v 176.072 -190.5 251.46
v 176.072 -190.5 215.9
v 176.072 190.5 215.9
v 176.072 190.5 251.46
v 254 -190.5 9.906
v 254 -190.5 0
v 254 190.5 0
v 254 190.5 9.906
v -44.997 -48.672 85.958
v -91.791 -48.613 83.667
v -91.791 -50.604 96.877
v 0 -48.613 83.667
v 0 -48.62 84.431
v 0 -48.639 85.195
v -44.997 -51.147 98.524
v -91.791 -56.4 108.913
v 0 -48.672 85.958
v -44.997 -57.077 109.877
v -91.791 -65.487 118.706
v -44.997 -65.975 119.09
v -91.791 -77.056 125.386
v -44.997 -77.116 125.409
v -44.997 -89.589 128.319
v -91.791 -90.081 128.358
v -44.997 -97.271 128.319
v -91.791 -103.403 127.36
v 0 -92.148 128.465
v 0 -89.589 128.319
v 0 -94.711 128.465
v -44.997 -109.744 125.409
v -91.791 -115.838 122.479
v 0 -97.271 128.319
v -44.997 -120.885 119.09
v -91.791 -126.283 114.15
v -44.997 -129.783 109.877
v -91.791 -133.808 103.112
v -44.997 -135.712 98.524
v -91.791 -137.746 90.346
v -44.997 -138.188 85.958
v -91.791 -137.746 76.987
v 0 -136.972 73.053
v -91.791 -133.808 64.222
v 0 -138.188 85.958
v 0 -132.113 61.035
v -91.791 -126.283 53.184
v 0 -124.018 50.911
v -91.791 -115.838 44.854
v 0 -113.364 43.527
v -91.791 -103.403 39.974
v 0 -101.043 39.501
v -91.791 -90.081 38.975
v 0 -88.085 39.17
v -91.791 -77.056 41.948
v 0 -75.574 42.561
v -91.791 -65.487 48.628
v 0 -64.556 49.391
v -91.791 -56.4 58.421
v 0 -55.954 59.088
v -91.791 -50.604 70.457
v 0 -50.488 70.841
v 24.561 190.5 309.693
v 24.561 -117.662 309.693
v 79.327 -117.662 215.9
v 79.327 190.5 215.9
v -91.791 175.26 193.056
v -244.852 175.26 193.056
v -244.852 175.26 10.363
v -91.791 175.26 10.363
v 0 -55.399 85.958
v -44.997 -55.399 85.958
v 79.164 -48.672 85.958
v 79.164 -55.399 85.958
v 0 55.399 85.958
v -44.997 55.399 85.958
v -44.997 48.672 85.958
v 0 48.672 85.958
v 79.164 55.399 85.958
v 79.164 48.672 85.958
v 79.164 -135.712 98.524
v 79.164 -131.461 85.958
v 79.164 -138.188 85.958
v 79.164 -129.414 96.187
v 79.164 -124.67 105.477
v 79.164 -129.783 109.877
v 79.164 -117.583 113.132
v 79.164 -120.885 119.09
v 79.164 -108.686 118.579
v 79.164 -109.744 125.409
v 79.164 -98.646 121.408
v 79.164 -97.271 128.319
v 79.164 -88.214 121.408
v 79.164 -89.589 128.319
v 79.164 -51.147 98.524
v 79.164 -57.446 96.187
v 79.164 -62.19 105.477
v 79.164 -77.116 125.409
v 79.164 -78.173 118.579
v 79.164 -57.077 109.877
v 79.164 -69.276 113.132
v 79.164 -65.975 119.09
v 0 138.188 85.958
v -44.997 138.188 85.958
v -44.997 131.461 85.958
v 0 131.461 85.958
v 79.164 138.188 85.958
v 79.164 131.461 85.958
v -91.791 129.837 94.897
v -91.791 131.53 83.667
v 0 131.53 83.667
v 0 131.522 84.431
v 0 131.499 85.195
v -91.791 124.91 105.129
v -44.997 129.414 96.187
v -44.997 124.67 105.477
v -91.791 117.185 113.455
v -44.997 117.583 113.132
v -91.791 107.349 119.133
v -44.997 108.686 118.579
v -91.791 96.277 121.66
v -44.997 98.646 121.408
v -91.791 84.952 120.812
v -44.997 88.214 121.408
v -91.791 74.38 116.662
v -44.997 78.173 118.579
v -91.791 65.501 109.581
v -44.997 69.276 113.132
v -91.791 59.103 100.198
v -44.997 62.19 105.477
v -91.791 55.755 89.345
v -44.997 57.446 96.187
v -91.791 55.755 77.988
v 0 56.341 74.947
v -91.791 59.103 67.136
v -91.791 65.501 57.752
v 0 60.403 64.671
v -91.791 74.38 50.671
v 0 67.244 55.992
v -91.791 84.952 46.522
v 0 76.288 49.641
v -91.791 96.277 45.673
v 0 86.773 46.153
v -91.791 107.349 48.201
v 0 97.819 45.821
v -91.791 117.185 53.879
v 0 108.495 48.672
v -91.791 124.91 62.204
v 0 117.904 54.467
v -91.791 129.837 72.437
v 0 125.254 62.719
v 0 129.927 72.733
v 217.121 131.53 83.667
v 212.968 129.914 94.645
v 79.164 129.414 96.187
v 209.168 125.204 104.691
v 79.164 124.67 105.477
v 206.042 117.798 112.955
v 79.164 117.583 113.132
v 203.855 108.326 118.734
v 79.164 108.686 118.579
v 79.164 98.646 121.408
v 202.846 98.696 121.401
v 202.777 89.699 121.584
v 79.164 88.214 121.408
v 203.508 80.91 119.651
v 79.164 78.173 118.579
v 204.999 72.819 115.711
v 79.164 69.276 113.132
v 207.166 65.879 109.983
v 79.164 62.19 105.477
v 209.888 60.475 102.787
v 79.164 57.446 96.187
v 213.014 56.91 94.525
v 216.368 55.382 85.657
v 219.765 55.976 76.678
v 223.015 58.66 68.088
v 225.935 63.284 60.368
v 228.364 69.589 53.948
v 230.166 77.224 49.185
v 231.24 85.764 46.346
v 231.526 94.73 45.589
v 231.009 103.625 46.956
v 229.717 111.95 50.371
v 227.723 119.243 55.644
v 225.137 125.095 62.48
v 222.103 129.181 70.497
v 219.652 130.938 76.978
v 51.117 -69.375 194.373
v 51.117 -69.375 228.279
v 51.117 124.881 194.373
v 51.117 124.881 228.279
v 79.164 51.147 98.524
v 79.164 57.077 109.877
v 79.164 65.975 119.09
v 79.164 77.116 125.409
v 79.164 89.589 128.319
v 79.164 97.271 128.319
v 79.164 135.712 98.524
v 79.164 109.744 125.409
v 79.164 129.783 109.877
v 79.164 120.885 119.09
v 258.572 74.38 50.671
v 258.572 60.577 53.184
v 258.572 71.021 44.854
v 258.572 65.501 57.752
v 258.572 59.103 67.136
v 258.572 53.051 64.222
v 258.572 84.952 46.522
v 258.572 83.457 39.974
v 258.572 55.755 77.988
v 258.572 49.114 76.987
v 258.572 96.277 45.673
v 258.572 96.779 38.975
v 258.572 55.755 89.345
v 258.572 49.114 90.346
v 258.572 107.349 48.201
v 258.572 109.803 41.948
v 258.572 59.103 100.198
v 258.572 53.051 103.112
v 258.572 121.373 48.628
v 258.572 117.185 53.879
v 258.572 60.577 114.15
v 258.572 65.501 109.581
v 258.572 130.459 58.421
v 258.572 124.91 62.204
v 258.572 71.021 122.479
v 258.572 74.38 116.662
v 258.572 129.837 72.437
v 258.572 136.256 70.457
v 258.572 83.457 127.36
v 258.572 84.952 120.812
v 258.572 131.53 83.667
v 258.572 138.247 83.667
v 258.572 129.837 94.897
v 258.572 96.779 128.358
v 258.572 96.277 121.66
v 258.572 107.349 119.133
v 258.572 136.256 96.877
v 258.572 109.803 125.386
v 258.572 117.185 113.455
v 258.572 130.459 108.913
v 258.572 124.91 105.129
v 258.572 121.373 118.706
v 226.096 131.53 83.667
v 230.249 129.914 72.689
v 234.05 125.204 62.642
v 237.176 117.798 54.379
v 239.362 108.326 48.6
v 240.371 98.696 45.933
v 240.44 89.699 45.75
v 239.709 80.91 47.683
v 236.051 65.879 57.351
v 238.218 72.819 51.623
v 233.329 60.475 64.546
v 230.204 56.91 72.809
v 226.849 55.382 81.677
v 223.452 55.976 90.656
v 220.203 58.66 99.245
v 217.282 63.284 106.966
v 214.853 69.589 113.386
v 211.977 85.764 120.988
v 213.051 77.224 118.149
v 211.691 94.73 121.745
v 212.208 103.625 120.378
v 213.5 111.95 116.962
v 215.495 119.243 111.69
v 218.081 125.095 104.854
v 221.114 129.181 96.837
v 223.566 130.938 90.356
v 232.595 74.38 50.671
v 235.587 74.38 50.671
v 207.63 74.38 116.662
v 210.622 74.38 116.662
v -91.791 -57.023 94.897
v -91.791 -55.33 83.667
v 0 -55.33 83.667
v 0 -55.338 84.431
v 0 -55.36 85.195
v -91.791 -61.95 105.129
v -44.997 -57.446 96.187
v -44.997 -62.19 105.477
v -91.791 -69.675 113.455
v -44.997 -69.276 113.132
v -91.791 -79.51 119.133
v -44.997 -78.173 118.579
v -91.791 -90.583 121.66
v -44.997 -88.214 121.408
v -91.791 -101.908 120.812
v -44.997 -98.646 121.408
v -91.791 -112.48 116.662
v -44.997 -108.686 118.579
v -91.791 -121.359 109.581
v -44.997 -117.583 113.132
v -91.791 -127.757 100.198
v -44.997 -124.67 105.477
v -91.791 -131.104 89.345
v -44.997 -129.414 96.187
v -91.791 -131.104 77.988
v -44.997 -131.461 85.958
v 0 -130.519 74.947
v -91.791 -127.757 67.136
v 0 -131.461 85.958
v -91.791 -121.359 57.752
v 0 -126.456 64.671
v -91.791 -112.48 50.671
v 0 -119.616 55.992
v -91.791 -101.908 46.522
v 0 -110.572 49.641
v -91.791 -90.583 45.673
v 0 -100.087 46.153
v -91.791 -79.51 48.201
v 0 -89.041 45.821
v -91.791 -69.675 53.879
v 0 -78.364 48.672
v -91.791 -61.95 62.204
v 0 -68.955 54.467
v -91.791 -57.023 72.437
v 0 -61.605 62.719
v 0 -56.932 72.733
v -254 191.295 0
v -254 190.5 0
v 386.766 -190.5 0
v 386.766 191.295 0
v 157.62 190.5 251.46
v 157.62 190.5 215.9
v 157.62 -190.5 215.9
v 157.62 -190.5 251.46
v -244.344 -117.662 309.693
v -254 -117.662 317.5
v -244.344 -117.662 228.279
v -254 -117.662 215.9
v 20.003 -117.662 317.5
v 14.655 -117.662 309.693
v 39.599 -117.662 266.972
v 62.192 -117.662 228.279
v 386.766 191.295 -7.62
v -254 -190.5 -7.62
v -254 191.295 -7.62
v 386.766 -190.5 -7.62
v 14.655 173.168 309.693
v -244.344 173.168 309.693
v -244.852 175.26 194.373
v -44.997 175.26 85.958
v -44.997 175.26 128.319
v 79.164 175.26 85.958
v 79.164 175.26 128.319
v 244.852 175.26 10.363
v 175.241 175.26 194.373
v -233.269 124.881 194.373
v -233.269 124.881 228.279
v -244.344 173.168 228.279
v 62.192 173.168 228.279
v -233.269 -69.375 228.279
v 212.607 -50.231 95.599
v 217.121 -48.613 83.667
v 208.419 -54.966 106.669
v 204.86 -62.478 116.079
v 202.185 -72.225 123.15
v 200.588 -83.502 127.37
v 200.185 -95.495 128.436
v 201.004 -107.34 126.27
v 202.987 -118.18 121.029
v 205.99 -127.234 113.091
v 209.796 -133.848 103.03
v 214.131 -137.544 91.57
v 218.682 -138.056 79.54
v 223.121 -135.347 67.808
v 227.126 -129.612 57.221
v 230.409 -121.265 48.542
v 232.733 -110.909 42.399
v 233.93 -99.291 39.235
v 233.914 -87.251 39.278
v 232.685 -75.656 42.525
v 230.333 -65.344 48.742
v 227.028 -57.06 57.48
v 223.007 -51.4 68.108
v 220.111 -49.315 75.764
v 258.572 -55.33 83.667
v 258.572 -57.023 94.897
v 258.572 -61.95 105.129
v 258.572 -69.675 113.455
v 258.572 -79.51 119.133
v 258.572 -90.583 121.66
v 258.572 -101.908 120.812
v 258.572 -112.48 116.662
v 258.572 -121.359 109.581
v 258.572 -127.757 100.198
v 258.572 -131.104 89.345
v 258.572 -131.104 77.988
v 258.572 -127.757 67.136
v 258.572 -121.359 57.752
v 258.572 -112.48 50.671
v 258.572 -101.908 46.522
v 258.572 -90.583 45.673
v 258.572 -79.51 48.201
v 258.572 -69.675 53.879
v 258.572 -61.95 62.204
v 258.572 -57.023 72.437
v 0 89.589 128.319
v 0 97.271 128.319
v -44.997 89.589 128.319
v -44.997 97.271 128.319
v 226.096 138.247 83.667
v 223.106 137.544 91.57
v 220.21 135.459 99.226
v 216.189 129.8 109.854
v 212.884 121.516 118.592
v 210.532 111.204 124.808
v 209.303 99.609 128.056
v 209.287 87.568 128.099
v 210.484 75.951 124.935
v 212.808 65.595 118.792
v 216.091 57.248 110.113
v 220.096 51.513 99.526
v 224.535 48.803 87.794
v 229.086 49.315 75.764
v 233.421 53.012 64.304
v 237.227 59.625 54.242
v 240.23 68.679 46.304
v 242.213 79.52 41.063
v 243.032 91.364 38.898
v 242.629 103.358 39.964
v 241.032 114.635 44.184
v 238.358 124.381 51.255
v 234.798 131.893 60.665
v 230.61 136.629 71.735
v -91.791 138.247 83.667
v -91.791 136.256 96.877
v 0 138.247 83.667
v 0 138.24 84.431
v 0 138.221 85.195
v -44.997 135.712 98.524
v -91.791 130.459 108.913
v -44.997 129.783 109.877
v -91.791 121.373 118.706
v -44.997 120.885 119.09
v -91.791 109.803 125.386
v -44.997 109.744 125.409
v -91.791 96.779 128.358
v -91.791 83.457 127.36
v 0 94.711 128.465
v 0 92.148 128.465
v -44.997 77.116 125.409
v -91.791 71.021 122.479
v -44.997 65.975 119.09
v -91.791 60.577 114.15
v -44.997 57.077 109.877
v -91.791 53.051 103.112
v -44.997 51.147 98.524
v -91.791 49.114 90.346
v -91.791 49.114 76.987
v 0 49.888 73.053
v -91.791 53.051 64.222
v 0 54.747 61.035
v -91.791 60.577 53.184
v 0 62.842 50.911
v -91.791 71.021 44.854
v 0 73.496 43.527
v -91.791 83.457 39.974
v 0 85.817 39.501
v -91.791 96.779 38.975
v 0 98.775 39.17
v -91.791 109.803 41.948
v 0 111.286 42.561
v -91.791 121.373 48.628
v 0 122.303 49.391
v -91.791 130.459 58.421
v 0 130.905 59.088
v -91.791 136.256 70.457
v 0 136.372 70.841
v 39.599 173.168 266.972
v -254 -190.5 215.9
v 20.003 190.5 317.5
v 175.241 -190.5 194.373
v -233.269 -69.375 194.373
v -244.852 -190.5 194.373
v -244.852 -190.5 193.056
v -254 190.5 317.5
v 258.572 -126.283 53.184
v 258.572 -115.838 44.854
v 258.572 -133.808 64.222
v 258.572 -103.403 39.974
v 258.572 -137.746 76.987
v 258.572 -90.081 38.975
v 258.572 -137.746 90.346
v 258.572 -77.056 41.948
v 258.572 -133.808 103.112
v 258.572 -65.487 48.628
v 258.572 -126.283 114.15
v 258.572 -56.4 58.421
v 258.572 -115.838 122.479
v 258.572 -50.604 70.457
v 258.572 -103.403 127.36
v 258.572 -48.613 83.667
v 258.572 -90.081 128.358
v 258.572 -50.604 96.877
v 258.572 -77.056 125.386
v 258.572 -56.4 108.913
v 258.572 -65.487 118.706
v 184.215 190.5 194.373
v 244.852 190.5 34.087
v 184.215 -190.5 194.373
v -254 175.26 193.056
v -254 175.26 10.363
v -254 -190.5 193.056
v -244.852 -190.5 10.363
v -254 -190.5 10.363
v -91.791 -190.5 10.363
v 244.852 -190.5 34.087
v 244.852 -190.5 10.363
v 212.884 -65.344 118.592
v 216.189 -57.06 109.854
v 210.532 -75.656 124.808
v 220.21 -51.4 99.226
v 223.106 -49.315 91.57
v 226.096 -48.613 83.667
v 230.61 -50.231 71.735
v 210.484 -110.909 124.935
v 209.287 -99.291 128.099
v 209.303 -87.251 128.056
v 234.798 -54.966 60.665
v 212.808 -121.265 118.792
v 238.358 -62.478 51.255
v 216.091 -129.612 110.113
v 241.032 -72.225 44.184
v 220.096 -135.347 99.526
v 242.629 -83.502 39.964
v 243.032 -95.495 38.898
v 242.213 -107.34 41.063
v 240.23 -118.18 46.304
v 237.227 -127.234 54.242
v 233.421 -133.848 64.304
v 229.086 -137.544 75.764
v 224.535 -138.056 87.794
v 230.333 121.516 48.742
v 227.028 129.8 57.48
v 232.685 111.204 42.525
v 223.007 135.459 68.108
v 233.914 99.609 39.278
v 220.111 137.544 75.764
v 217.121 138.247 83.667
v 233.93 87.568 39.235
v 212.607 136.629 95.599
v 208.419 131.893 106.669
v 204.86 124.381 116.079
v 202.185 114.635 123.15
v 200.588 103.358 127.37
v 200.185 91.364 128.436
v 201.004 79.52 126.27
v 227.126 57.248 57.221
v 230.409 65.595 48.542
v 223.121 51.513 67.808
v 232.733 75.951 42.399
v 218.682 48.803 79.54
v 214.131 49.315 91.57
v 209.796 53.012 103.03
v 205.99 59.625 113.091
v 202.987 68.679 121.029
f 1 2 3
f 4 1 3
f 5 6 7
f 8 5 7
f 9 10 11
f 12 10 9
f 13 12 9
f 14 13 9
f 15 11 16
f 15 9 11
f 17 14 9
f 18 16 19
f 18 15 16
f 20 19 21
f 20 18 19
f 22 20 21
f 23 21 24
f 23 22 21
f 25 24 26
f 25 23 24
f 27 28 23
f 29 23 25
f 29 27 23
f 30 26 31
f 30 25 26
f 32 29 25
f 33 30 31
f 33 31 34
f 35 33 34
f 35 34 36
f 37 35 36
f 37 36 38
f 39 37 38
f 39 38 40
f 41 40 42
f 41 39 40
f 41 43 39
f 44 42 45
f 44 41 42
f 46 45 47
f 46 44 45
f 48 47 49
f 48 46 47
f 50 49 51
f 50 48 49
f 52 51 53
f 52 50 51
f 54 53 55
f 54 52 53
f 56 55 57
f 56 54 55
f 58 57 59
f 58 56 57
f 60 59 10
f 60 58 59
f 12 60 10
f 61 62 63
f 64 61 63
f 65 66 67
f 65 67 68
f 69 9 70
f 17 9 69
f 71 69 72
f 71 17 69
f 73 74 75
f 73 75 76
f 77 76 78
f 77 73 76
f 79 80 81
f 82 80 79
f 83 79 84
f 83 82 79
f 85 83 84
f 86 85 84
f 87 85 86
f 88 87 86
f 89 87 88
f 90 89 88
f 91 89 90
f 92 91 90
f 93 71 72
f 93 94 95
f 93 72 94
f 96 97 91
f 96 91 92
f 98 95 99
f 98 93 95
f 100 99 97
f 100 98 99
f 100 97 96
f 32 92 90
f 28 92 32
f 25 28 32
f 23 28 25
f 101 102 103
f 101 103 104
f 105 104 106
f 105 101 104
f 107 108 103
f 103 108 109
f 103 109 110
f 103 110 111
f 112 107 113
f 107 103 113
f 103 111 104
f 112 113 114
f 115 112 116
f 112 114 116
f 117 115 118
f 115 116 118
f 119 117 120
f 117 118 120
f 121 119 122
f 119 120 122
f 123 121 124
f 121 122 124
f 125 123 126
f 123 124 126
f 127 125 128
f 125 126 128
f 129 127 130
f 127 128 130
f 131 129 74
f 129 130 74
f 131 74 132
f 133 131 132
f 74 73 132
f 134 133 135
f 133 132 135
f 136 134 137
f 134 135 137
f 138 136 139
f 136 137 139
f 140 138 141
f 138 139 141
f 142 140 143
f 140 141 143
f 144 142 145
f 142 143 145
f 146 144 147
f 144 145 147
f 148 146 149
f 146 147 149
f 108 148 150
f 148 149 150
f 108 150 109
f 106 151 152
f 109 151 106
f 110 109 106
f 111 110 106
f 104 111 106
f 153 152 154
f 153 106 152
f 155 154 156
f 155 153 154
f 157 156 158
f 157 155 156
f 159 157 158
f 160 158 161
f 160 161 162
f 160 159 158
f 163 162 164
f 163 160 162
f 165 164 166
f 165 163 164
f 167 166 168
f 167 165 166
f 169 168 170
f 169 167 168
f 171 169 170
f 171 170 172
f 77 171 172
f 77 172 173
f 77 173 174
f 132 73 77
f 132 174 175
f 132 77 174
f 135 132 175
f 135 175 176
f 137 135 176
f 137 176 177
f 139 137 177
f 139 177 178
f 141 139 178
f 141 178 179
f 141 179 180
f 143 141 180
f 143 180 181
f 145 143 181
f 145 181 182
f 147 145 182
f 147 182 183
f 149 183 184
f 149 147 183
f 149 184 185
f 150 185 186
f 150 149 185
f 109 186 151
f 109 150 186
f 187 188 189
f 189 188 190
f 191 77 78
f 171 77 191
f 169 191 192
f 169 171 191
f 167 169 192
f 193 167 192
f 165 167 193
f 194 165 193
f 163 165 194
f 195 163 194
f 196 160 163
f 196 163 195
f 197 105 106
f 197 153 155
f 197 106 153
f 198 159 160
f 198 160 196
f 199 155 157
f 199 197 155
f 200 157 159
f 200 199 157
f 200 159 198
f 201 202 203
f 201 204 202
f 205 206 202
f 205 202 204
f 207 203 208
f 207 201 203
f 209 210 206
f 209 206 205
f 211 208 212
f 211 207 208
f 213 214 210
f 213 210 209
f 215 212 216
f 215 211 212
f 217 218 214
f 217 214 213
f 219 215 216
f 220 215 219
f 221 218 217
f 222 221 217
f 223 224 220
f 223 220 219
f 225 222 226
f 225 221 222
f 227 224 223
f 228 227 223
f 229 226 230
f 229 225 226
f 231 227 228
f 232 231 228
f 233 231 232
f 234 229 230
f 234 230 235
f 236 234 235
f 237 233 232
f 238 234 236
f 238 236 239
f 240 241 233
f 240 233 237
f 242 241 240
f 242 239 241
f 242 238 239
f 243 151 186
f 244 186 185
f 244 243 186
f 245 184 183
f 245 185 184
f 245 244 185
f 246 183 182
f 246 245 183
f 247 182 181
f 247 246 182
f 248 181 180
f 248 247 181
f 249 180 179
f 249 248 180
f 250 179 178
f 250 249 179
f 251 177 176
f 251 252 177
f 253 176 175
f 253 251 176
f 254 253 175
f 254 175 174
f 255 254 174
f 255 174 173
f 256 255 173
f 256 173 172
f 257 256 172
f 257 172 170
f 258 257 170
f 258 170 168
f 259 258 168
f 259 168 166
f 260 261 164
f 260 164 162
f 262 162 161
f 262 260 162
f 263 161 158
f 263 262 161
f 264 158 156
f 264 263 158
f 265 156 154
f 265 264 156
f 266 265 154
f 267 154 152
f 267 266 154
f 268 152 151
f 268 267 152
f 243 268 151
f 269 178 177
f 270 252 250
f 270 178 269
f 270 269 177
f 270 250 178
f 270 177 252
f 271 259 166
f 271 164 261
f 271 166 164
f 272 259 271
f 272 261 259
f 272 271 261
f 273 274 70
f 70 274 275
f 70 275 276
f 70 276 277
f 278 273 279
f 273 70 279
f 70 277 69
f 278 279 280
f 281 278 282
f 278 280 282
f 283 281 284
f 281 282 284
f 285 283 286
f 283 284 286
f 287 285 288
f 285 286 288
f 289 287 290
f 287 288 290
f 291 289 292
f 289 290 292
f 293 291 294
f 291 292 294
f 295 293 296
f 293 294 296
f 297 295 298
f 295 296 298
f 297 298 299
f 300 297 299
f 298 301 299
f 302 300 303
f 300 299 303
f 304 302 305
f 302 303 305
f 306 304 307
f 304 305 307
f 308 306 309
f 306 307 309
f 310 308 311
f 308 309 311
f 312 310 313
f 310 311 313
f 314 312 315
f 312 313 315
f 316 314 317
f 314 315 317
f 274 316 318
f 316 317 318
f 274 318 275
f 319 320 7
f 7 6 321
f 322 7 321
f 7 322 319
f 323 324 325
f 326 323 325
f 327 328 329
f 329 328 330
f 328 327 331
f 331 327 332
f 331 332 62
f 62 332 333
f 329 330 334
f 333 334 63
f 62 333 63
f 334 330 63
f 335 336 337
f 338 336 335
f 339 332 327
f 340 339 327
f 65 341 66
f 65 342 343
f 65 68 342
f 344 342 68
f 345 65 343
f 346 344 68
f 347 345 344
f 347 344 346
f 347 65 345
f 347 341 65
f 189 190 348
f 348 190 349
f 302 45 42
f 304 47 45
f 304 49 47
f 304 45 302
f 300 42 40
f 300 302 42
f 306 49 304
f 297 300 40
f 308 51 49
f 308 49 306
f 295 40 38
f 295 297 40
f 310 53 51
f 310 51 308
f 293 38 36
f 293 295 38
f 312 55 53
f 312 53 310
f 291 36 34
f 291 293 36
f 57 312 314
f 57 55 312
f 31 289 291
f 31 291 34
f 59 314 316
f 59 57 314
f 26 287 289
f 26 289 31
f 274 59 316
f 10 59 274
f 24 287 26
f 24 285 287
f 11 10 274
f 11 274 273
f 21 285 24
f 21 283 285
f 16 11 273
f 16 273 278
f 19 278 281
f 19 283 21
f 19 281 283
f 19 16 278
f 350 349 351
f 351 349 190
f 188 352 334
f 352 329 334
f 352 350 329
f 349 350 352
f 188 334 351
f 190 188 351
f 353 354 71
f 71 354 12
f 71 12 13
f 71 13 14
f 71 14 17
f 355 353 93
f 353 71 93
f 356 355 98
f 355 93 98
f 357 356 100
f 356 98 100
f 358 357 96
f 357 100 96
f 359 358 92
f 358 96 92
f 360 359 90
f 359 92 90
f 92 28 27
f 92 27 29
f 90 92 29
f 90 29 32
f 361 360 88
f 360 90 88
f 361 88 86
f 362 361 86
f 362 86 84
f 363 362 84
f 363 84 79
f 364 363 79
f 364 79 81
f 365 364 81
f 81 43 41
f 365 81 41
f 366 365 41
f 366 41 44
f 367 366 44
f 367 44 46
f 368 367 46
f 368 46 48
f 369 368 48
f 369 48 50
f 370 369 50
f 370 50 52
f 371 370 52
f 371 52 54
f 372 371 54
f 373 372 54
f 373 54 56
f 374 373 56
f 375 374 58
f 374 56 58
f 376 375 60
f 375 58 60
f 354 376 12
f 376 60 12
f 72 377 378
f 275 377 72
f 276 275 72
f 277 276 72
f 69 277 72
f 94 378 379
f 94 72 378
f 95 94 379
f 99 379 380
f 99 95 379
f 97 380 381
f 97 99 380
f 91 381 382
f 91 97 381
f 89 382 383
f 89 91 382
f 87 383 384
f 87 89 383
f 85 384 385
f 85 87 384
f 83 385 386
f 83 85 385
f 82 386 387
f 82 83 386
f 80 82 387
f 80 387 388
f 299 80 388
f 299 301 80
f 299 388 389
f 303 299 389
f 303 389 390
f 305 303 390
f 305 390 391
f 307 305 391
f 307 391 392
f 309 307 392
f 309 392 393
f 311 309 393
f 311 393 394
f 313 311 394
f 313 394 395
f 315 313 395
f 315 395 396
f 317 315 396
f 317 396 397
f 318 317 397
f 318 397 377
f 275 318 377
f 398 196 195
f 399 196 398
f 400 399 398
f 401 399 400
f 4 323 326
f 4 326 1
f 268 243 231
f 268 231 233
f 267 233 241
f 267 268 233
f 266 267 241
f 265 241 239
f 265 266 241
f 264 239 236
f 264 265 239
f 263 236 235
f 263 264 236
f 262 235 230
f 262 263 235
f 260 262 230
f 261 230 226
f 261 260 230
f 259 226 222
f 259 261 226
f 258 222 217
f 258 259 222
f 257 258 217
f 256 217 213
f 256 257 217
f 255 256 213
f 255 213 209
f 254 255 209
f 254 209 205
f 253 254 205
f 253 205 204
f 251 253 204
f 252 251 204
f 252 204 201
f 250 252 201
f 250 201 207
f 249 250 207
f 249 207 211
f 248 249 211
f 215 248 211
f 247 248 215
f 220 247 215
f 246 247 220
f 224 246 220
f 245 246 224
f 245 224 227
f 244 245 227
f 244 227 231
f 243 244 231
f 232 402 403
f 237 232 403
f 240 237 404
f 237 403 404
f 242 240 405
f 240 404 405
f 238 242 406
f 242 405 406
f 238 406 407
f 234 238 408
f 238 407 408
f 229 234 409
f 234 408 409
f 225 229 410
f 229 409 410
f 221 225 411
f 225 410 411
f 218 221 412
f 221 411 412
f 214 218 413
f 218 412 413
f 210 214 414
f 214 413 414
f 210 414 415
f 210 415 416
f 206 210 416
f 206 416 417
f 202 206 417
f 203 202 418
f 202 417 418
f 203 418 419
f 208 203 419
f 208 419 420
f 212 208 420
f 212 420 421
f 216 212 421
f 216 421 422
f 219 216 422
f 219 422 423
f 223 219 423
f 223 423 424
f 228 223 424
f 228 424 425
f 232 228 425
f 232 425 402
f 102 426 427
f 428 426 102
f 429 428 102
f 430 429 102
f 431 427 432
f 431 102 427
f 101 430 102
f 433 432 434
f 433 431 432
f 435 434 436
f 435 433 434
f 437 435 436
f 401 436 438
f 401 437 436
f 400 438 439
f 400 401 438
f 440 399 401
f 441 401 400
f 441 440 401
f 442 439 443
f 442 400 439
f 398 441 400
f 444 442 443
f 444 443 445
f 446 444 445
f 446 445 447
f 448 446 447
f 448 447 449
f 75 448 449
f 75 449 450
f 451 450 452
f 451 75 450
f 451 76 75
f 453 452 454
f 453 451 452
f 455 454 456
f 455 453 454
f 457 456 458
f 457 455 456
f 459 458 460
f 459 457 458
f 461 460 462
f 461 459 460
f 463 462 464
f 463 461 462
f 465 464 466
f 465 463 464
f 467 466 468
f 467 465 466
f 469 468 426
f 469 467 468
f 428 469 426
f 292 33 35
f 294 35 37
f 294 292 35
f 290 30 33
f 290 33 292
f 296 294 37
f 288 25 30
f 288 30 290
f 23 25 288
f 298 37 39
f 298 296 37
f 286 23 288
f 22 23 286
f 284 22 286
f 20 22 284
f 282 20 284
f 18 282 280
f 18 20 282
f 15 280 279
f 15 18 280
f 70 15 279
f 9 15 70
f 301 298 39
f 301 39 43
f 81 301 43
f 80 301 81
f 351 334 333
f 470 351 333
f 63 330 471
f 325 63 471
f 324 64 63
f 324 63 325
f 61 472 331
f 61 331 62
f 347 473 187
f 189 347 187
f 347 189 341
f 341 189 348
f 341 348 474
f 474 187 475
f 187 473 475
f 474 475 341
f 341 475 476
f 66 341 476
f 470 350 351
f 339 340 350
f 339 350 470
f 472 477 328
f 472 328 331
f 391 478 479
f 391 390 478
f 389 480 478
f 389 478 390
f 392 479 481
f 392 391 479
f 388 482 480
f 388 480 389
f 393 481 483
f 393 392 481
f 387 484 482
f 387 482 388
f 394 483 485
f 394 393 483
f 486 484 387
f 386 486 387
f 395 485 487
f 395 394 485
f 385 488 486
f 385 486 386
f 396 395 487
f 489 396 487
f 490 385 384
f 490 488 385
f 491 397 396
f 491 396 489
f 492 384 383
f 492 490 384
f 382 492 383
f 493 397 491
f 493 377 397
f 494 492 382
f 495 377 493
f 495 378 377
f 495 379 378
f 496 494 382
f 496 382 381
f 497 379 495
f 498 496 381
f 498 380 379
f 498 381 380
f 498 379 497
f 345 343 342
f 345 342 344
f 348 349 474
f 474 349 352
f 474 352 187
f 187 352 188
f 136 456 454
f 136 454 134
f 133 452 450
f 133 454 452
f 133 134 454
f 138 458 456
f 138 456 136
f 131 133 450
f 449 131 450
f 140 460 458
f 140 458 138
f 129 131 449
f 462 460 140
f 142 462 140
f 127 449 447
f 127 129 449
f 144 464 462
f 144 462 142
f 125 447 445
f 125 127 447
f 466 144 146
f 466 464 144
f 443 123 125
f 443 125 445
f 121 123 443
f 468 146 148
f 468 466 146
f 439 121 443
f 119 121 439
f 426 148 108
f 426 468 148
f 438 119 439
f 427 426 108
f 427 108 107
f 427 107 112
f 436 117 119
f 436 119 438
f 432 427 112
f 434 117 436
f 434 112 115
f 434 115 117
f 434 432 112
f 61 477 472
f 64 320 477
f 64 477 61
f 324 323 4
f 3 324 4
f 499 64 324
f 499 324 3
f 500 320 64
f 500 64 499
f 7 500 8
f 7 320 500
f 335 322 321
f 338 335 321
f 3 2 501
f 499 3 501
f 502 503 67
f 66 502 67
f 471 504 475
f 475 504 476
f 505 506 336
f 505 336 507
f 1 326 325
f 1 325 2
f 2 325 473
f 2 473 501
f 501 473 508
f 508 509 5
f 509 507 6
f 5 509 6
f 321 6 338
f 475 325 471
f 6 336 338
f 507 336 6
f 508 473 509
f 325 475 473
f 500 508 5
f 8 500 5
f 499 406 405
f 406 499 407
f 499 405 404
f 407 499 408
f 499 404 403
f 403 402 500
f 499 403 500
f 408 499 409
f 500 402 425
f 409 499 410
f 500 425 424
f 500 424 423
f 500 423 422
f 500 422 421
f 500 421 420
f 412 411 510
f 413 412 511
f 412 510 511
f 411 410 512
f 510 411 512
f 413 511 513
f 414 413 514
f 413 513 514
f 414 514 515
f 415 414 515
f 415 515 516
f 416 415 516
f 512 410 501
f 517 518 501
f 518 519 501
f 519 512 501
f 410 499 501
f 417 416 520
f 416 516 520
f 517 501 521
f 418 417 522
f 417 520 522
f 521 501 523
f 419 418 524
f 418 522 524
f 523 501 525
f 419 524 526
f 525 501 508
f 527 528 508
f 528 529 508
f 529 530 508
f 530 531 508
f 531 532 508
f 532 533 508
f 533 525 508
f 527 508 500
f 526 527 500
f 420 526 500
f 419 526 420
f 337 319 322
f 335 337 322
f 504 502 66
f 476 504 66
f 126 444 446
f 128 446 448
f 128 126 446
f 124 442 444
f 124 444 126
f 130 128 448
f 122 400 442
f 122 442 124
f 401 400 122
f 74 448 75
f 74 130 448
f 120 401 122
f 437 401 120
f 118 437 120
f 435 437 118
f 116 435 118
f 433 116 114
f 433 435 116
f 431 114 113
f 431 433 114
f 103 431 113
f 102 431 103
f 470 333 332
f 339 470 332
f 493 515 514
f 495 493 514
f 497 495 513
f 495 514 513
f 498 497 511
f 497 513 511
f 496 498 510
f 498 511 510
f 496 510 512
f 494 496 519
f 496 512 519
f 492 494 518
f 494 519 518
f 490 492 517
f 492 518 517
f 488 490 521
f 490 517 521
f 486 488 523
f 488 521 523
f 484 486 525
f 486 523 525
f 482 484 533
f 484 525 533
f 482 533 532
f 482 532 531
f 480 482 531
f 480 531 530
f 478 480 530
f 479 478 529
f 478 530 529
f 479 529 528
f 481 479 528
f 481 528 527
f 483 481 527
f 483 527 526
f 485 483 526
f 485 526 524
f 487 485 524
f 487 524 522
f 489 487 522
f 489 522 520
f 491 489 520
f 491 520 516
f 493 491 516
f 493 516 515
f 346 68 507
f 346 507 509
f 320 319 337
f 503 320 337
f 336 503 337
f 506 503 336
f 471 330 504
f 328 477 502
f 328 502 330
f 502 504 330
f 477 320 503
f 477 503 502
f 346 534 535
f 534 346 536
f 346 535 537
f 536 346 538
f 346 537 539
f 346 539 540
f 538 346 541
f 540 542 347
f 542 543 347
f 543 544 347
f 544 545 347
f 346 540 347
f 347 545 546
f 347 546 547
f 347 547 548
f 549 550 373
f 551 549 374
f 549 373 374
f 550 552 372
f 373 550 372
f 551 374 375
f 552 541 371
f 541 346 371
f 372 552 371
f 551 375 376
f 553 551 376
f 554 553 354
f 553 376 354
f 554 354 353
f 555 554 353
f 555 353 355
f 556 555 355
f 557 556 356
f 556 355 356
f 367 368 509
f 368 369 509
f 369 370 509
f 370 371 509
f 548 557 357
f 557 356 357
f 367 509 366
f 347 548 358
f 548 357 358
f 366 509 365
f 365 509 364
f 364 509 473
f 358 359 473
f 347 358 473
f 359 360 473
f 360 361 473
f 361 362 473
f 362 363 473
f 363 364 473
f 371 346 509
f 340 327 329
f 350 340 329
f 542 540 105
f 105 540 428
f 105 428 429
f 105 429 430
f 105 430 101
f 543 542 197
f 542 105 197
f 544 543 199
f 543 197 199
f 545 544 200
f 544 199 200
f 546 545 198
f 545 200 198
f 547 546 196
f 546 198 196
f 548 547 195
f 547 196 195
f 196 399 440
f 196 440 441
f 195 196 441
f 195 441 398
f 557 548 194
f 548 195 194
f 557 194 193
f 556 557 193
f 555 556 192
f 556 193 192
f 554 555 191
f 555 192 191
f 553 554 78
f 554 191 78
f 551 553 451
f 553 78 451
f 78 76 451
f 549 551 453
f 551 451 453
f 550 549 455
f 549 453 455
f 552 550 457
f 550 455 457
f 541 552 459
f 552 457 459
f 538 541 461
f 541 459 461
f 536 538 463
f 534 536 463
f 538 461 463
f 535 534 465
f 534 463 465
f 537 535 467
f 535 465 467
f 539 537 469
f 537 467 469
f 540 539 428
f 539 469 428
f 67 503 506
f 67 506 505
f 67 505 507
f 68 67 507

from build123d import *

# Parameters (mm, degrees)
F0_W      = 154.8604735136
F0_H      = 381
F0_W_2    = 202.8337074444
F0_W_3    = 150.305819042
F1_DEPTH  = 215.9
F3_DEPTH  = 365.76
F4_DEPTH  = 474.472
F5_DEPTH  = 384.81
F6_DEPTH  = 463.296
F7_DEPTH  = 453.644
F8_DEPTH  = 401.828
F9_W      = 333.3268084526
F9_H      = 308.1617667079
F10_DEPTH = 101.6
F12_DEPTH = 332.74
F13_DEPTH = 290.83
F14_W     = 640.7658
F14_H     = 381.7952661514
F15_DEPTH = 7.62
F16_W     = 18.4519021228
F16_H     = 174.1818501353
F16_H_2   = 32.6362997293
F17_DEPTH = 35.56
F18_R     = 44.8167953051
F18_R_2   = 38.1
F19_DEPTH = 258.572
F20_DEPTH = 485.14
F21_DEPTH = 258.572
F22_DEPTH = 57.658
F23_DEPTH = 72.898
F24_DEPTH = 250.19
F25_W     = 142.1934430047
F25_H     = 97.1279808664
F26_DEPTH = 68.58
F28_DEPTH = 340.868
F30_W     = 177.6428297162
F30_H     = 182.6925156638
F31_DEPTH = 723.9


# Not quite as in the source:
# - the program builds the solid bodies; features that only make, move or delete a surface that nothing else refers to are left out


with BuildPart() as f1:
    # F0 (on Top) → F1 (new body)
    with BuildSketch(Plane.XY):
        with Locations((-176.5697632432, 0)):
            Rectangle(F0_W, F0_H)
        with Locations((2.2773272358, 0)):
            Rectangle(F0_W_2, F0_H)
        with Locations((178.847090479, 0)):
            Rectangle(F0_W_3, F0_H)
    extrude(amount=F1_DEPTH)

    # F2 (on face) → F3 (cut)
    with BuildSketch(Plane.XZ.offset(190.5)):
        Polygon((-244.8522895575, 194.3728802726), (-244.8522895575, 10.3632332757), (244.8522895575, 10.3632332757), (175.2408137327, 194.3728802726), align=None)
    extrude(amount=-F3_DEPTH, mode=Mode.SUBTRACT)

    # F2 (on face) → F4 (cut)
    with BuildSketch(Plane.XZ.offset(190.5)):
        Polygon((215.0387168483, 194.3728802726), (244.8522895575, 115.5642510209), (244.8522895575, 194.3728802726), align=None)
    extrude(amount=-F4_DEPTH, mode=Mode.SUBTRACT)

    # F2 (on face) → F5 (cut)
    with BuildSketch(Plane.XZ.offset(190.5)):
        Polygon((244.8522895575, 194.3728802726), (244.8522895575, 115.5642510209), (254, 91.3833677769), (254, 215.9), (206.8949341774, 215.9), (215.0387168483, 194.3728802726), align=None)
    extrude(amount=-F5_DEPTH, mode=Mode.SUBTRACT)

    # F2 (on face) → F6 (cut)
    with BuildSketch(Plane.XZ.offset(190.5)):
        Polygon((184.2154591353, 194.3728802726), (244.8522895575, 34.0866396952), (244.8522895575, 115.5642510209), (215.0387168483, 194.3728802726), align=None)
    extrude(amount=-F6_DEPTH, mode=Mode.SUBTRACT)

    # F2 (on face) → F7 (cut)
    with BuildSketch(Plane.XZ.offset(190.5)):
        Polygon((244.8522895575, 115.5642510209), (244.8522895575, 34.0866396952), (254, 9.9057564512), (254, 91.3833677769), align=None)
    extrude(amount=-F7_DEPTH, mode=Mode.SUBTRACT)

    # F2 (on face) → F8 (cut)
    with BuildSketch(Plane.XZ.offset(190.5)):
        Polygon((176.0716764644, 215.9), (184.2154591353, 194.3728802726), (215.0387168483, 194.3728802726), (206.8949341774, 215.9), align=None)
    extrude(amount=-F8_DEPTH, mode=Mode.SUBTRACT)

    # F9 (on face) → F10 (join)
    with BuildSketch(Plane.XY.offset(215.9)):
        with Locations((-87.3365957737, 36.4191166461)):
            Rectangle(F9_W, F9_H)
    extrude(amount=F10_DEPTH)

    # F11 (on face) → F12 (cut)
    with BuildSketch(Plane.XZ.offset(117.6617667079)):
        Polygon((62.1921845761, 266.8175234586), (79.3268084526, 266.7), (79.3268084526, 317.5), (20.0025010854, 317.5), (24.5608866934, 309.6932172775), (62.1921845761, 309.6932172775), align=None)
        Polygon((62.1921845761, 245.2451009057), (79.3268084526, 215.9), (79.3268084526, 266.7), (62.1921845761, 266.8175234586), align=None)
        Polygon((24.5608866934, 309.6932172775), (49.5453838887, 266.9042657045), (62.1921845761, 266.8175234586), (62.1921845761, 309.6932172775), align=None)
        Polygon((49.5453838887, 266.9042657045), (62.1921845761, 245.2451009057), (62.1921845761, 266.8175234586), align=None)
    extrude(amount=-F12_DEPTH, mode=Mode.SUBTRACT)

    # F11 (on face) → F13 (cut)
    with BuildSketch(Plane.XZ.offset(117.6617667079)):
        Polygon((-87.3365957737, 267.843115824), (39.5991766547, 266.9724850411), (14.6545127754, 309.6932172775), (-87.3365957737, 309.6932172775), align=None)
        Polygon((-244.3442642689, 268.9200046058), (-87.3365957737, 267.843115824), (-87.3365957737, 309.6932172775), (-244.3442642689, 309.6932172775), align=None)
        Polygon((-87.3365957737, 228.2792460185), (62.1921845761, 228.2792460185), (39.5991766547, 266.9724850411), (-87.3365957737, 267.843115824), align=None)
        Polygon((-244.3442642689, 228.2792460185), (-87.3365957737, 228.2792460185), (-87.3365957737, 267.843115824), (-244.3442642689, 268.9200046058), align=None)
    extrude(amount=-F13_DEPTH, mode=Mode.SUBTRACT)

    # F14 (on face) → F15 (join)
    with BuildSketch(Plane(origin=(0, 0, 0), x_dir=(1, 0, 0), z_dir=(0, 0, -1))):
        with Locations((66.3829, -0.3976330757)):
            Rectangle(F14_W, F14_H)
    extrude(amount=F15_DEPTH)

    # F16 (on face) → F17 (join)
    with BuildSketch(Plane.XY.offset(215.9)):
        with Locations((166.845725403, 103.4090749323)):
            Rectangle(F16_W, F16_H)
        with Locations((166.845725403, 0)):
            Rectangle(F16_W, F16_H_2)
        with Locations((166.845725403, -103.4090749323)):
            Rectangle(F16_W, F16_H)
    extrude(amount=F17_DEPTH)

    # F18 (on Right) → F19 (join)
    with BuildSketch(Plane.YZ):
        with Locations((-93.4298427632, 83.6668761742)):
            Circle(F18_R)
        with Locations((-93.4298427632, 83.6668761742)):
            Circle(F18_R_2, mode=Mode.SUBTRACT)
    extrude(amount=F19_DEPTH)

    # F18 (on Right) → F20 (cut)
    with BuildSketch(Plane.YZ):
        with Locations((-93.4298427632, 83.6668761742)):
            Circle(F18_R_2)
    extrude(amount=F20_DEPTH, mode=Mode.SUBTRACT)

    # F18 (on Right) → F21 (join)
    with BuildSketch(Plane.YZ):
        with Locations((93.4298427632, 83.6668761742)):
            Circle(F18_R)
        with Locations((93.4298427632, 83.6668761742)):
            Circle(F18_R_2, mode=Mode.SUBTRACT)
        with Locations((-93.4298427632, 83.6668761742)):
            Circle(F18_R)
        with Locations((-93.4298427632, 83.6668761742)):
            Circle(F18_R_2, mode=Mode.SUBTRACT)
    extrude(amount=F21_DEPTH)

    # F18 (on Right) → F22 (cut)
    with BuildSketch(Plane.YZ):
        with Locations((-93.4298427632, 83.6668761742)):
            Circle(F18_R)
        with Locations((-93.4298427632, 83.6668761742)):
            Circle(F18_R_2, mode=Mode.SUBTRACT)
        with Locations((93.4298427632, 83.6668761742)):
            Circle(F18_R)
        with Locations((93.4298427632, 83.6668761742)):
            Circle(F18_R_2, mode=Mode.SUBTRACT)
    extrude(amount=-F22_DEPTH, mode=Mode.SUBTRACT)

    # F18 (on Right) + F21_face (on face) → F23 (cut)
    with BuildSketch(Plane.YZ):
        with Locations((-93.4298427632, 83.6668761742)):
            Circle(F18_R)
        with Locations((-93.4298427632, 83.6668761742)):
            Circle(F18_R_2, mode=Mode.SUBTRACT)
        with Locations((93.4298427632, 83.6668761742)):
            Circle(F18_R)
        with Locations((93.4298427632, 83.6668761742)):
            Circle(F18_R_2, mode=Mode.SUBTRACT)
    with BuildSketch(Plane(origin=(226.0959173271, 93.4298427632, 83.6668761742), x_dir=(0, 1, 0), z_dir=(0.9353094659, 0, 0.3538307547))):
        with BuildLine():
            add(Edge.make_bspline(
                [(38.1, 0), (38.1, -70.5554024353), (-19.05, -35.2777012177), (-76.2, 0), (-19.05, 35.2777012177), (38.1, 70.5554024353), (38.1, 0)],
                knots=[1.5707963268, 1.5707963268, 1.5707963268, 3.6651914292, 3.6651914292, 5.7595865316, 5.7595865316, 7.853981634, 7.853981634, 7.853981634], degree=2, weights=[1, 0.5, 1, 0.5, 1, 0.5, 1]))
        make_face()
    extrude(amount=-F23_DEPTH, dir=(1, 0, 0), mode=Mode.SUBTRACT)

    # F18 (on Right) → F24 (join)
    with BuildSketch(Plane.YZ):
        with Locations((-93.4298427632, 83.6668761742)):
            Circle(F18_R)
        with Locations((-93.4298427632, 83.6668761742)):
            Circle(F18_R_2, mode=Mode.SUBTRACT)
        with Locations((93.4298427632, 83.6668761742)):
            Circle(F18_R)
        with Locations((93.4298427632, 83.6668761742)):
            Circle(F18_R_2, mode=Mode.SUBTRACT)
    extrude(amount=-F24_DEPTH)

    # F25 (on face) → F26 (cut)
    with BuildSketch(Plane.XY.offset(228.2792460185)):
        with Locations((-162.1727613487, -20.8107571411)):
            Rectangle(F25_W, F25_H)
        with Locations((-19.979318344, -20.8107571411)):
            Rectangle(F25_W, F25_H)
        with Locations((-162.1727613487, 76.3172237253)):
            Rectangle(F25_W, F25_H)
        with Locations((-19.979318344, 76.3172237253)):
            Rectangle(F25_W, F25_H)
    extrude(amount=-F26_DEPTH, mode=Mode.SUBTRACT)

    # F27 (on face) → F28 (cut)
    with BuildSketch(Plane.XZ.offset(-175.26)):
        Polygon((-44.9973344803, 128.3188015223), (-44.9973344803, 85.9577953815), (79.164236784, 85.9577953815), (79.164236784, 121.7455416918), (79.164236784, 128.3188015223), align=None)
    extrude(amount=F28_DEPTH, mode=Mode.SUBTRACT)

    # F30 (on face) → F31 (cut)
    with BuildSketch(Plane.XZ.offset(-175.26)):
        with Locations((-180.61241135, 101.7094911076)):
            Rectangle(F30_W, F30_H)
    extrude(amount=F31_DEPTH, mode=Mode.SUBTRACT)


solid = f1.part
